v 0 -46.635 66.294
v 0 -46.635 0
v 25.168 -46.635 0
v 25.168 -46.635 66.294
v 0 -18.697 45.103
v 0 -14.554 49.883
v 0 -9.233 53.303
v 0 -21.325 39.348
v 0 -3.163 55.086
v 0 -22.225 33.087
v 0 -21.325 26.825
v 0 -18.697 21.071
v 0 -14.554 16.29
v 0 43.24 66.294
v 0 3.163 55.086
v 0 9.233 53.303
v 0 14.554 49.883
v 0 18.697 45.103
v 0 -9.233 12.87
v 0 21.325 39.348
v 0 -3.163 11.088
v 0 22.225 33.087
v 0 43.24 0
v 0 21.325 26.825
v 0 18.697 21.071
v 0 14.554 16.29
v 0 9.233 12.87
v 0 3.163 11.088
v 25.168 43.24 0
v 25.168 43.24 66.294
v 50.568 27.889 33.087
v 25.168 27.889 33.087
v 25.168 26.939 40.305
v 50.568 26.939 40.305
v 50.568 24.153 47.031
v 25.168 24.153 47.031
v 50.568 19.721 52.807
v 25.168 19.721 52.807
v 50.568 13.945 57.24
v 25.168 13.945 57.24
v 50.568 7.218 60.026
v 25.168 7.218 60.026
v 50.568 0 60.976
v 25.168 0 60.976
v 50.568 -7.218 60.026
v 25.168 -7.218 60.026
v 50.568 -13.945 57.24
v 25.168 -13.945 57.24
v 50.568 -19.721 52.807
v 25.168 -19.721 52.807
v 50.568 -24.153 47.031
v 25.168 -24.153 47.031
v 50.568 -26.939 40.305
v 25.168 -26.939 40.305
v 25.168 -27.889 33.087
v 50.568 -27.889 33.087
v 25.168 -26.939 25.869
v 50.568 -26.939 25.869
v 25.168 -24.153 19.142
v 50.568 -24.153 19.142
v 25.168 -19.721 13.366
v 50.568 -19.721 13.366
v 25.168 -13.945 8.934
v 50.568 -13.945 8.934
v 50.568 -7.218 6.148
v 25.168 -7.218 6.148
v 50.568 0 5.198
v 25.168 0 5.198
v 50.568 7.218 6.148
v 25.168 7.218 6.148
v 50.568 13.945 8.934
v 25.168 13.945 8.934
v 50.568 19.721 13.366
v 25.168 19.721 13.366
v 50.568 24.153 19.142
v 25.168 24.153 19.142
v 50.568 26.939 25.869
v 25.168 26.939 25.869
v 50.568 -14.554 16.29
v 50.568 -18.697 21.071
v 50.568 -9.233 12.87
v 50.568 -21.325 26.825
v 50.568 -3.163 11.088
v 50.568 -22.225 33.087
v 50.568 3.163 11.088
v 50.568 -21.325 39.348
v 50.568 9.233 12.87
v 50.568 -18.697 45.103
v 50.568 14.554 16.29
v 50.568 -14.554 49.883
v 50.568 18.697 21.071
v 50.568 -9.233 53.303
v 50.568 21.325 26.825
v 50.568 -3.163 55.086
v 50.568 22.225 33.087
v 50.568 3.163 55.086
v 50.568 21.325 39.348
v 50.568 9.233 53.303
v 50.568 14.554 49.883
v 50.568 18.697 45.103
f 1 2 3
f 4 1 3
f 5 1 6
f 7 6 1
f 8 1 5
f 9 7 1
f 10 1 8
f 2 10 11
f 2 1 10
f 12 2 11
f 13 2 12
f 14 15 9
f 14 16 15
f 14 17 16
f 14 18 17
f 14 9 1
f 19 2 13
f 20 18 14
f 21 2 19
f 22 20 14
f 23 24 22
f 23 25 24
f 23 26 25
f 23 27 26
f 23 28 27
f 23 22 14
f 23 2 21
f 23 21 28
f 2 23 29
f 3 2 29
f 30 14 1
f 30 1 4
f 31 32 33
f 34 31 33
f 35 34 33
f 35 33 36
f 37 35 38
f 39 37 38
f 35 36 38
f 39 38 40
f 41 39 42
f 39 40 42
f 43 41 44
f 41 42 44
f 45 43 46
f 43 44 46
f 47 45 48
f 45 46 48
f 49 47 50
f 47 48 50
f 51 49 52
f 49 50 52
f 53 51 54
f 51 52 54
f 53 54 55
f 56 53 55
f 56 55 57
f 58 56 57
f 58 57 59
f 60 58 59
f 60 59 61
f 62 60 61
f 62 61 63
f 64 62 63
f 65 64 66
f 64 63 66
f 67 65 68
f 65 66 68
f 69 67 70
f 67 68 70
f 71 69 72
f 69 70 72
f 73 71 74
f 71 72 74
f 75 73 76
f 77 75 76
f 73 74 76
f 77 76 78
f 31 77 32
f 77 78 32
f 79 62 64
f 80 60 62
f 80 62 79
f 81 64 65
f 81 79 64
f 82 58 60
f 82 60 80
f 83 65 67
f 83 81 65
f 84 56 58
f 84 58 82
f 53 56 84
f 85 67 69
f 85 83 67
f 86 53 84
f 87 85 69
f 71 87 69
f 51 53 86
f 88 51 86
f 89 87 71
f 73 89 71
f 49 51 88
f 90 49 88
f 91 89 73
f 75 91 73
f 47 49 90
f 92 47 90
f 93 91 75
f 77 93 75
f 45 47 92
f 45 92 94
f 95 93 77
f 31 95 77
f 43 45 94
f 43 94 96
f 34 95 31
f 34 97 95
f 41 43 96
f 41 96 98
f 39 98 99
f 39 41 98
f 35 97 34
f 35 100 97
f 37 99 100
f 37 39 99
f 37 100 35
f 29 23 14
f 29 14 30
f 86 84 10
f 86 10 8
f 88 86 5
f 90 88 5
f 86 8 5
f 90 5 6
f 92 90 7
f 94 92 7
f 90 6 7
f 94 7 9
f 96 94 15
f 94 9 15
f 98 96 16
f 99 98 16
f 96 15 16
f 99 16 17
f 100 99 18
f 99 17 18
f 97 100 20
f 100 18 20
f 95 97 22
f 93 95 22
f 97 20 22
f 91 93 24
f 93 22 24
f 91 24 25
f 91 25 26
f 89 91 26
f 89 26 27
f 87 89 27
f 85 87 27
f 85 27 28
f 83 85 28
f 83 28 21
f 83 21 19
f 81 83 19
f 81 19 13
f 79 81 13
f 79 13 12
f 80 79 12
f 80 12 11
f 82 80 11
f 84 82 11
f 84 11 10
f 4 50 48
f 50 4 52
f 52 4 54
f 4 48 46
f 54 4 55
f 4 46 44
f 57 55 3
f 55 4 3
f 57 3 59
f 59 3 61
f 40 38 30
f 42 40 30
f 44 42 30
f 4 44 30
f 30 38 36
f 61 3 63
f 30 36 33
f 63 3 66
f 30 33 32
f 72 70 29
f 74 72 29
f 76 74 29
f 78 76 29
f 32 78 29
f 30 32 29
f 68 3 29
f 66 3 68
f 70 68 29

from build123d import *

# Parameters (mm, degrees)
F0_W     = 25.1680966467
F0_H     = 89.8744724691
F1_DEPTH = 66.294
F2_R     = 27.8892037899
F3_DEPTH = 25.4
F5_D     = 44.45


with BuildPart() as f1:
    # F0 (on Top) → F1 (new body)
    with BuildSketch(Plane.XY):
        with Locations((12.5840483233, -1.6976874322)):
            Rectangle(F0_W, F0_H)
    extrude(amount=F1_DEPTH)

    # F2 (on face) → F3 (join)
    with BuildSketch(Plane.YZ.offset(25.1680966467)):
        with Locations((0, 33.0868437886)):
            Circle(F2_R)
    extrude(amount=F3_DEPTH)

    # F5 (through all)
    with Locations(Plane.YZ.offset(50.5680966467)):
        with Locations((0, 33.0868437886)):
            Hole(F5_D / 2)


solid = f1.part
